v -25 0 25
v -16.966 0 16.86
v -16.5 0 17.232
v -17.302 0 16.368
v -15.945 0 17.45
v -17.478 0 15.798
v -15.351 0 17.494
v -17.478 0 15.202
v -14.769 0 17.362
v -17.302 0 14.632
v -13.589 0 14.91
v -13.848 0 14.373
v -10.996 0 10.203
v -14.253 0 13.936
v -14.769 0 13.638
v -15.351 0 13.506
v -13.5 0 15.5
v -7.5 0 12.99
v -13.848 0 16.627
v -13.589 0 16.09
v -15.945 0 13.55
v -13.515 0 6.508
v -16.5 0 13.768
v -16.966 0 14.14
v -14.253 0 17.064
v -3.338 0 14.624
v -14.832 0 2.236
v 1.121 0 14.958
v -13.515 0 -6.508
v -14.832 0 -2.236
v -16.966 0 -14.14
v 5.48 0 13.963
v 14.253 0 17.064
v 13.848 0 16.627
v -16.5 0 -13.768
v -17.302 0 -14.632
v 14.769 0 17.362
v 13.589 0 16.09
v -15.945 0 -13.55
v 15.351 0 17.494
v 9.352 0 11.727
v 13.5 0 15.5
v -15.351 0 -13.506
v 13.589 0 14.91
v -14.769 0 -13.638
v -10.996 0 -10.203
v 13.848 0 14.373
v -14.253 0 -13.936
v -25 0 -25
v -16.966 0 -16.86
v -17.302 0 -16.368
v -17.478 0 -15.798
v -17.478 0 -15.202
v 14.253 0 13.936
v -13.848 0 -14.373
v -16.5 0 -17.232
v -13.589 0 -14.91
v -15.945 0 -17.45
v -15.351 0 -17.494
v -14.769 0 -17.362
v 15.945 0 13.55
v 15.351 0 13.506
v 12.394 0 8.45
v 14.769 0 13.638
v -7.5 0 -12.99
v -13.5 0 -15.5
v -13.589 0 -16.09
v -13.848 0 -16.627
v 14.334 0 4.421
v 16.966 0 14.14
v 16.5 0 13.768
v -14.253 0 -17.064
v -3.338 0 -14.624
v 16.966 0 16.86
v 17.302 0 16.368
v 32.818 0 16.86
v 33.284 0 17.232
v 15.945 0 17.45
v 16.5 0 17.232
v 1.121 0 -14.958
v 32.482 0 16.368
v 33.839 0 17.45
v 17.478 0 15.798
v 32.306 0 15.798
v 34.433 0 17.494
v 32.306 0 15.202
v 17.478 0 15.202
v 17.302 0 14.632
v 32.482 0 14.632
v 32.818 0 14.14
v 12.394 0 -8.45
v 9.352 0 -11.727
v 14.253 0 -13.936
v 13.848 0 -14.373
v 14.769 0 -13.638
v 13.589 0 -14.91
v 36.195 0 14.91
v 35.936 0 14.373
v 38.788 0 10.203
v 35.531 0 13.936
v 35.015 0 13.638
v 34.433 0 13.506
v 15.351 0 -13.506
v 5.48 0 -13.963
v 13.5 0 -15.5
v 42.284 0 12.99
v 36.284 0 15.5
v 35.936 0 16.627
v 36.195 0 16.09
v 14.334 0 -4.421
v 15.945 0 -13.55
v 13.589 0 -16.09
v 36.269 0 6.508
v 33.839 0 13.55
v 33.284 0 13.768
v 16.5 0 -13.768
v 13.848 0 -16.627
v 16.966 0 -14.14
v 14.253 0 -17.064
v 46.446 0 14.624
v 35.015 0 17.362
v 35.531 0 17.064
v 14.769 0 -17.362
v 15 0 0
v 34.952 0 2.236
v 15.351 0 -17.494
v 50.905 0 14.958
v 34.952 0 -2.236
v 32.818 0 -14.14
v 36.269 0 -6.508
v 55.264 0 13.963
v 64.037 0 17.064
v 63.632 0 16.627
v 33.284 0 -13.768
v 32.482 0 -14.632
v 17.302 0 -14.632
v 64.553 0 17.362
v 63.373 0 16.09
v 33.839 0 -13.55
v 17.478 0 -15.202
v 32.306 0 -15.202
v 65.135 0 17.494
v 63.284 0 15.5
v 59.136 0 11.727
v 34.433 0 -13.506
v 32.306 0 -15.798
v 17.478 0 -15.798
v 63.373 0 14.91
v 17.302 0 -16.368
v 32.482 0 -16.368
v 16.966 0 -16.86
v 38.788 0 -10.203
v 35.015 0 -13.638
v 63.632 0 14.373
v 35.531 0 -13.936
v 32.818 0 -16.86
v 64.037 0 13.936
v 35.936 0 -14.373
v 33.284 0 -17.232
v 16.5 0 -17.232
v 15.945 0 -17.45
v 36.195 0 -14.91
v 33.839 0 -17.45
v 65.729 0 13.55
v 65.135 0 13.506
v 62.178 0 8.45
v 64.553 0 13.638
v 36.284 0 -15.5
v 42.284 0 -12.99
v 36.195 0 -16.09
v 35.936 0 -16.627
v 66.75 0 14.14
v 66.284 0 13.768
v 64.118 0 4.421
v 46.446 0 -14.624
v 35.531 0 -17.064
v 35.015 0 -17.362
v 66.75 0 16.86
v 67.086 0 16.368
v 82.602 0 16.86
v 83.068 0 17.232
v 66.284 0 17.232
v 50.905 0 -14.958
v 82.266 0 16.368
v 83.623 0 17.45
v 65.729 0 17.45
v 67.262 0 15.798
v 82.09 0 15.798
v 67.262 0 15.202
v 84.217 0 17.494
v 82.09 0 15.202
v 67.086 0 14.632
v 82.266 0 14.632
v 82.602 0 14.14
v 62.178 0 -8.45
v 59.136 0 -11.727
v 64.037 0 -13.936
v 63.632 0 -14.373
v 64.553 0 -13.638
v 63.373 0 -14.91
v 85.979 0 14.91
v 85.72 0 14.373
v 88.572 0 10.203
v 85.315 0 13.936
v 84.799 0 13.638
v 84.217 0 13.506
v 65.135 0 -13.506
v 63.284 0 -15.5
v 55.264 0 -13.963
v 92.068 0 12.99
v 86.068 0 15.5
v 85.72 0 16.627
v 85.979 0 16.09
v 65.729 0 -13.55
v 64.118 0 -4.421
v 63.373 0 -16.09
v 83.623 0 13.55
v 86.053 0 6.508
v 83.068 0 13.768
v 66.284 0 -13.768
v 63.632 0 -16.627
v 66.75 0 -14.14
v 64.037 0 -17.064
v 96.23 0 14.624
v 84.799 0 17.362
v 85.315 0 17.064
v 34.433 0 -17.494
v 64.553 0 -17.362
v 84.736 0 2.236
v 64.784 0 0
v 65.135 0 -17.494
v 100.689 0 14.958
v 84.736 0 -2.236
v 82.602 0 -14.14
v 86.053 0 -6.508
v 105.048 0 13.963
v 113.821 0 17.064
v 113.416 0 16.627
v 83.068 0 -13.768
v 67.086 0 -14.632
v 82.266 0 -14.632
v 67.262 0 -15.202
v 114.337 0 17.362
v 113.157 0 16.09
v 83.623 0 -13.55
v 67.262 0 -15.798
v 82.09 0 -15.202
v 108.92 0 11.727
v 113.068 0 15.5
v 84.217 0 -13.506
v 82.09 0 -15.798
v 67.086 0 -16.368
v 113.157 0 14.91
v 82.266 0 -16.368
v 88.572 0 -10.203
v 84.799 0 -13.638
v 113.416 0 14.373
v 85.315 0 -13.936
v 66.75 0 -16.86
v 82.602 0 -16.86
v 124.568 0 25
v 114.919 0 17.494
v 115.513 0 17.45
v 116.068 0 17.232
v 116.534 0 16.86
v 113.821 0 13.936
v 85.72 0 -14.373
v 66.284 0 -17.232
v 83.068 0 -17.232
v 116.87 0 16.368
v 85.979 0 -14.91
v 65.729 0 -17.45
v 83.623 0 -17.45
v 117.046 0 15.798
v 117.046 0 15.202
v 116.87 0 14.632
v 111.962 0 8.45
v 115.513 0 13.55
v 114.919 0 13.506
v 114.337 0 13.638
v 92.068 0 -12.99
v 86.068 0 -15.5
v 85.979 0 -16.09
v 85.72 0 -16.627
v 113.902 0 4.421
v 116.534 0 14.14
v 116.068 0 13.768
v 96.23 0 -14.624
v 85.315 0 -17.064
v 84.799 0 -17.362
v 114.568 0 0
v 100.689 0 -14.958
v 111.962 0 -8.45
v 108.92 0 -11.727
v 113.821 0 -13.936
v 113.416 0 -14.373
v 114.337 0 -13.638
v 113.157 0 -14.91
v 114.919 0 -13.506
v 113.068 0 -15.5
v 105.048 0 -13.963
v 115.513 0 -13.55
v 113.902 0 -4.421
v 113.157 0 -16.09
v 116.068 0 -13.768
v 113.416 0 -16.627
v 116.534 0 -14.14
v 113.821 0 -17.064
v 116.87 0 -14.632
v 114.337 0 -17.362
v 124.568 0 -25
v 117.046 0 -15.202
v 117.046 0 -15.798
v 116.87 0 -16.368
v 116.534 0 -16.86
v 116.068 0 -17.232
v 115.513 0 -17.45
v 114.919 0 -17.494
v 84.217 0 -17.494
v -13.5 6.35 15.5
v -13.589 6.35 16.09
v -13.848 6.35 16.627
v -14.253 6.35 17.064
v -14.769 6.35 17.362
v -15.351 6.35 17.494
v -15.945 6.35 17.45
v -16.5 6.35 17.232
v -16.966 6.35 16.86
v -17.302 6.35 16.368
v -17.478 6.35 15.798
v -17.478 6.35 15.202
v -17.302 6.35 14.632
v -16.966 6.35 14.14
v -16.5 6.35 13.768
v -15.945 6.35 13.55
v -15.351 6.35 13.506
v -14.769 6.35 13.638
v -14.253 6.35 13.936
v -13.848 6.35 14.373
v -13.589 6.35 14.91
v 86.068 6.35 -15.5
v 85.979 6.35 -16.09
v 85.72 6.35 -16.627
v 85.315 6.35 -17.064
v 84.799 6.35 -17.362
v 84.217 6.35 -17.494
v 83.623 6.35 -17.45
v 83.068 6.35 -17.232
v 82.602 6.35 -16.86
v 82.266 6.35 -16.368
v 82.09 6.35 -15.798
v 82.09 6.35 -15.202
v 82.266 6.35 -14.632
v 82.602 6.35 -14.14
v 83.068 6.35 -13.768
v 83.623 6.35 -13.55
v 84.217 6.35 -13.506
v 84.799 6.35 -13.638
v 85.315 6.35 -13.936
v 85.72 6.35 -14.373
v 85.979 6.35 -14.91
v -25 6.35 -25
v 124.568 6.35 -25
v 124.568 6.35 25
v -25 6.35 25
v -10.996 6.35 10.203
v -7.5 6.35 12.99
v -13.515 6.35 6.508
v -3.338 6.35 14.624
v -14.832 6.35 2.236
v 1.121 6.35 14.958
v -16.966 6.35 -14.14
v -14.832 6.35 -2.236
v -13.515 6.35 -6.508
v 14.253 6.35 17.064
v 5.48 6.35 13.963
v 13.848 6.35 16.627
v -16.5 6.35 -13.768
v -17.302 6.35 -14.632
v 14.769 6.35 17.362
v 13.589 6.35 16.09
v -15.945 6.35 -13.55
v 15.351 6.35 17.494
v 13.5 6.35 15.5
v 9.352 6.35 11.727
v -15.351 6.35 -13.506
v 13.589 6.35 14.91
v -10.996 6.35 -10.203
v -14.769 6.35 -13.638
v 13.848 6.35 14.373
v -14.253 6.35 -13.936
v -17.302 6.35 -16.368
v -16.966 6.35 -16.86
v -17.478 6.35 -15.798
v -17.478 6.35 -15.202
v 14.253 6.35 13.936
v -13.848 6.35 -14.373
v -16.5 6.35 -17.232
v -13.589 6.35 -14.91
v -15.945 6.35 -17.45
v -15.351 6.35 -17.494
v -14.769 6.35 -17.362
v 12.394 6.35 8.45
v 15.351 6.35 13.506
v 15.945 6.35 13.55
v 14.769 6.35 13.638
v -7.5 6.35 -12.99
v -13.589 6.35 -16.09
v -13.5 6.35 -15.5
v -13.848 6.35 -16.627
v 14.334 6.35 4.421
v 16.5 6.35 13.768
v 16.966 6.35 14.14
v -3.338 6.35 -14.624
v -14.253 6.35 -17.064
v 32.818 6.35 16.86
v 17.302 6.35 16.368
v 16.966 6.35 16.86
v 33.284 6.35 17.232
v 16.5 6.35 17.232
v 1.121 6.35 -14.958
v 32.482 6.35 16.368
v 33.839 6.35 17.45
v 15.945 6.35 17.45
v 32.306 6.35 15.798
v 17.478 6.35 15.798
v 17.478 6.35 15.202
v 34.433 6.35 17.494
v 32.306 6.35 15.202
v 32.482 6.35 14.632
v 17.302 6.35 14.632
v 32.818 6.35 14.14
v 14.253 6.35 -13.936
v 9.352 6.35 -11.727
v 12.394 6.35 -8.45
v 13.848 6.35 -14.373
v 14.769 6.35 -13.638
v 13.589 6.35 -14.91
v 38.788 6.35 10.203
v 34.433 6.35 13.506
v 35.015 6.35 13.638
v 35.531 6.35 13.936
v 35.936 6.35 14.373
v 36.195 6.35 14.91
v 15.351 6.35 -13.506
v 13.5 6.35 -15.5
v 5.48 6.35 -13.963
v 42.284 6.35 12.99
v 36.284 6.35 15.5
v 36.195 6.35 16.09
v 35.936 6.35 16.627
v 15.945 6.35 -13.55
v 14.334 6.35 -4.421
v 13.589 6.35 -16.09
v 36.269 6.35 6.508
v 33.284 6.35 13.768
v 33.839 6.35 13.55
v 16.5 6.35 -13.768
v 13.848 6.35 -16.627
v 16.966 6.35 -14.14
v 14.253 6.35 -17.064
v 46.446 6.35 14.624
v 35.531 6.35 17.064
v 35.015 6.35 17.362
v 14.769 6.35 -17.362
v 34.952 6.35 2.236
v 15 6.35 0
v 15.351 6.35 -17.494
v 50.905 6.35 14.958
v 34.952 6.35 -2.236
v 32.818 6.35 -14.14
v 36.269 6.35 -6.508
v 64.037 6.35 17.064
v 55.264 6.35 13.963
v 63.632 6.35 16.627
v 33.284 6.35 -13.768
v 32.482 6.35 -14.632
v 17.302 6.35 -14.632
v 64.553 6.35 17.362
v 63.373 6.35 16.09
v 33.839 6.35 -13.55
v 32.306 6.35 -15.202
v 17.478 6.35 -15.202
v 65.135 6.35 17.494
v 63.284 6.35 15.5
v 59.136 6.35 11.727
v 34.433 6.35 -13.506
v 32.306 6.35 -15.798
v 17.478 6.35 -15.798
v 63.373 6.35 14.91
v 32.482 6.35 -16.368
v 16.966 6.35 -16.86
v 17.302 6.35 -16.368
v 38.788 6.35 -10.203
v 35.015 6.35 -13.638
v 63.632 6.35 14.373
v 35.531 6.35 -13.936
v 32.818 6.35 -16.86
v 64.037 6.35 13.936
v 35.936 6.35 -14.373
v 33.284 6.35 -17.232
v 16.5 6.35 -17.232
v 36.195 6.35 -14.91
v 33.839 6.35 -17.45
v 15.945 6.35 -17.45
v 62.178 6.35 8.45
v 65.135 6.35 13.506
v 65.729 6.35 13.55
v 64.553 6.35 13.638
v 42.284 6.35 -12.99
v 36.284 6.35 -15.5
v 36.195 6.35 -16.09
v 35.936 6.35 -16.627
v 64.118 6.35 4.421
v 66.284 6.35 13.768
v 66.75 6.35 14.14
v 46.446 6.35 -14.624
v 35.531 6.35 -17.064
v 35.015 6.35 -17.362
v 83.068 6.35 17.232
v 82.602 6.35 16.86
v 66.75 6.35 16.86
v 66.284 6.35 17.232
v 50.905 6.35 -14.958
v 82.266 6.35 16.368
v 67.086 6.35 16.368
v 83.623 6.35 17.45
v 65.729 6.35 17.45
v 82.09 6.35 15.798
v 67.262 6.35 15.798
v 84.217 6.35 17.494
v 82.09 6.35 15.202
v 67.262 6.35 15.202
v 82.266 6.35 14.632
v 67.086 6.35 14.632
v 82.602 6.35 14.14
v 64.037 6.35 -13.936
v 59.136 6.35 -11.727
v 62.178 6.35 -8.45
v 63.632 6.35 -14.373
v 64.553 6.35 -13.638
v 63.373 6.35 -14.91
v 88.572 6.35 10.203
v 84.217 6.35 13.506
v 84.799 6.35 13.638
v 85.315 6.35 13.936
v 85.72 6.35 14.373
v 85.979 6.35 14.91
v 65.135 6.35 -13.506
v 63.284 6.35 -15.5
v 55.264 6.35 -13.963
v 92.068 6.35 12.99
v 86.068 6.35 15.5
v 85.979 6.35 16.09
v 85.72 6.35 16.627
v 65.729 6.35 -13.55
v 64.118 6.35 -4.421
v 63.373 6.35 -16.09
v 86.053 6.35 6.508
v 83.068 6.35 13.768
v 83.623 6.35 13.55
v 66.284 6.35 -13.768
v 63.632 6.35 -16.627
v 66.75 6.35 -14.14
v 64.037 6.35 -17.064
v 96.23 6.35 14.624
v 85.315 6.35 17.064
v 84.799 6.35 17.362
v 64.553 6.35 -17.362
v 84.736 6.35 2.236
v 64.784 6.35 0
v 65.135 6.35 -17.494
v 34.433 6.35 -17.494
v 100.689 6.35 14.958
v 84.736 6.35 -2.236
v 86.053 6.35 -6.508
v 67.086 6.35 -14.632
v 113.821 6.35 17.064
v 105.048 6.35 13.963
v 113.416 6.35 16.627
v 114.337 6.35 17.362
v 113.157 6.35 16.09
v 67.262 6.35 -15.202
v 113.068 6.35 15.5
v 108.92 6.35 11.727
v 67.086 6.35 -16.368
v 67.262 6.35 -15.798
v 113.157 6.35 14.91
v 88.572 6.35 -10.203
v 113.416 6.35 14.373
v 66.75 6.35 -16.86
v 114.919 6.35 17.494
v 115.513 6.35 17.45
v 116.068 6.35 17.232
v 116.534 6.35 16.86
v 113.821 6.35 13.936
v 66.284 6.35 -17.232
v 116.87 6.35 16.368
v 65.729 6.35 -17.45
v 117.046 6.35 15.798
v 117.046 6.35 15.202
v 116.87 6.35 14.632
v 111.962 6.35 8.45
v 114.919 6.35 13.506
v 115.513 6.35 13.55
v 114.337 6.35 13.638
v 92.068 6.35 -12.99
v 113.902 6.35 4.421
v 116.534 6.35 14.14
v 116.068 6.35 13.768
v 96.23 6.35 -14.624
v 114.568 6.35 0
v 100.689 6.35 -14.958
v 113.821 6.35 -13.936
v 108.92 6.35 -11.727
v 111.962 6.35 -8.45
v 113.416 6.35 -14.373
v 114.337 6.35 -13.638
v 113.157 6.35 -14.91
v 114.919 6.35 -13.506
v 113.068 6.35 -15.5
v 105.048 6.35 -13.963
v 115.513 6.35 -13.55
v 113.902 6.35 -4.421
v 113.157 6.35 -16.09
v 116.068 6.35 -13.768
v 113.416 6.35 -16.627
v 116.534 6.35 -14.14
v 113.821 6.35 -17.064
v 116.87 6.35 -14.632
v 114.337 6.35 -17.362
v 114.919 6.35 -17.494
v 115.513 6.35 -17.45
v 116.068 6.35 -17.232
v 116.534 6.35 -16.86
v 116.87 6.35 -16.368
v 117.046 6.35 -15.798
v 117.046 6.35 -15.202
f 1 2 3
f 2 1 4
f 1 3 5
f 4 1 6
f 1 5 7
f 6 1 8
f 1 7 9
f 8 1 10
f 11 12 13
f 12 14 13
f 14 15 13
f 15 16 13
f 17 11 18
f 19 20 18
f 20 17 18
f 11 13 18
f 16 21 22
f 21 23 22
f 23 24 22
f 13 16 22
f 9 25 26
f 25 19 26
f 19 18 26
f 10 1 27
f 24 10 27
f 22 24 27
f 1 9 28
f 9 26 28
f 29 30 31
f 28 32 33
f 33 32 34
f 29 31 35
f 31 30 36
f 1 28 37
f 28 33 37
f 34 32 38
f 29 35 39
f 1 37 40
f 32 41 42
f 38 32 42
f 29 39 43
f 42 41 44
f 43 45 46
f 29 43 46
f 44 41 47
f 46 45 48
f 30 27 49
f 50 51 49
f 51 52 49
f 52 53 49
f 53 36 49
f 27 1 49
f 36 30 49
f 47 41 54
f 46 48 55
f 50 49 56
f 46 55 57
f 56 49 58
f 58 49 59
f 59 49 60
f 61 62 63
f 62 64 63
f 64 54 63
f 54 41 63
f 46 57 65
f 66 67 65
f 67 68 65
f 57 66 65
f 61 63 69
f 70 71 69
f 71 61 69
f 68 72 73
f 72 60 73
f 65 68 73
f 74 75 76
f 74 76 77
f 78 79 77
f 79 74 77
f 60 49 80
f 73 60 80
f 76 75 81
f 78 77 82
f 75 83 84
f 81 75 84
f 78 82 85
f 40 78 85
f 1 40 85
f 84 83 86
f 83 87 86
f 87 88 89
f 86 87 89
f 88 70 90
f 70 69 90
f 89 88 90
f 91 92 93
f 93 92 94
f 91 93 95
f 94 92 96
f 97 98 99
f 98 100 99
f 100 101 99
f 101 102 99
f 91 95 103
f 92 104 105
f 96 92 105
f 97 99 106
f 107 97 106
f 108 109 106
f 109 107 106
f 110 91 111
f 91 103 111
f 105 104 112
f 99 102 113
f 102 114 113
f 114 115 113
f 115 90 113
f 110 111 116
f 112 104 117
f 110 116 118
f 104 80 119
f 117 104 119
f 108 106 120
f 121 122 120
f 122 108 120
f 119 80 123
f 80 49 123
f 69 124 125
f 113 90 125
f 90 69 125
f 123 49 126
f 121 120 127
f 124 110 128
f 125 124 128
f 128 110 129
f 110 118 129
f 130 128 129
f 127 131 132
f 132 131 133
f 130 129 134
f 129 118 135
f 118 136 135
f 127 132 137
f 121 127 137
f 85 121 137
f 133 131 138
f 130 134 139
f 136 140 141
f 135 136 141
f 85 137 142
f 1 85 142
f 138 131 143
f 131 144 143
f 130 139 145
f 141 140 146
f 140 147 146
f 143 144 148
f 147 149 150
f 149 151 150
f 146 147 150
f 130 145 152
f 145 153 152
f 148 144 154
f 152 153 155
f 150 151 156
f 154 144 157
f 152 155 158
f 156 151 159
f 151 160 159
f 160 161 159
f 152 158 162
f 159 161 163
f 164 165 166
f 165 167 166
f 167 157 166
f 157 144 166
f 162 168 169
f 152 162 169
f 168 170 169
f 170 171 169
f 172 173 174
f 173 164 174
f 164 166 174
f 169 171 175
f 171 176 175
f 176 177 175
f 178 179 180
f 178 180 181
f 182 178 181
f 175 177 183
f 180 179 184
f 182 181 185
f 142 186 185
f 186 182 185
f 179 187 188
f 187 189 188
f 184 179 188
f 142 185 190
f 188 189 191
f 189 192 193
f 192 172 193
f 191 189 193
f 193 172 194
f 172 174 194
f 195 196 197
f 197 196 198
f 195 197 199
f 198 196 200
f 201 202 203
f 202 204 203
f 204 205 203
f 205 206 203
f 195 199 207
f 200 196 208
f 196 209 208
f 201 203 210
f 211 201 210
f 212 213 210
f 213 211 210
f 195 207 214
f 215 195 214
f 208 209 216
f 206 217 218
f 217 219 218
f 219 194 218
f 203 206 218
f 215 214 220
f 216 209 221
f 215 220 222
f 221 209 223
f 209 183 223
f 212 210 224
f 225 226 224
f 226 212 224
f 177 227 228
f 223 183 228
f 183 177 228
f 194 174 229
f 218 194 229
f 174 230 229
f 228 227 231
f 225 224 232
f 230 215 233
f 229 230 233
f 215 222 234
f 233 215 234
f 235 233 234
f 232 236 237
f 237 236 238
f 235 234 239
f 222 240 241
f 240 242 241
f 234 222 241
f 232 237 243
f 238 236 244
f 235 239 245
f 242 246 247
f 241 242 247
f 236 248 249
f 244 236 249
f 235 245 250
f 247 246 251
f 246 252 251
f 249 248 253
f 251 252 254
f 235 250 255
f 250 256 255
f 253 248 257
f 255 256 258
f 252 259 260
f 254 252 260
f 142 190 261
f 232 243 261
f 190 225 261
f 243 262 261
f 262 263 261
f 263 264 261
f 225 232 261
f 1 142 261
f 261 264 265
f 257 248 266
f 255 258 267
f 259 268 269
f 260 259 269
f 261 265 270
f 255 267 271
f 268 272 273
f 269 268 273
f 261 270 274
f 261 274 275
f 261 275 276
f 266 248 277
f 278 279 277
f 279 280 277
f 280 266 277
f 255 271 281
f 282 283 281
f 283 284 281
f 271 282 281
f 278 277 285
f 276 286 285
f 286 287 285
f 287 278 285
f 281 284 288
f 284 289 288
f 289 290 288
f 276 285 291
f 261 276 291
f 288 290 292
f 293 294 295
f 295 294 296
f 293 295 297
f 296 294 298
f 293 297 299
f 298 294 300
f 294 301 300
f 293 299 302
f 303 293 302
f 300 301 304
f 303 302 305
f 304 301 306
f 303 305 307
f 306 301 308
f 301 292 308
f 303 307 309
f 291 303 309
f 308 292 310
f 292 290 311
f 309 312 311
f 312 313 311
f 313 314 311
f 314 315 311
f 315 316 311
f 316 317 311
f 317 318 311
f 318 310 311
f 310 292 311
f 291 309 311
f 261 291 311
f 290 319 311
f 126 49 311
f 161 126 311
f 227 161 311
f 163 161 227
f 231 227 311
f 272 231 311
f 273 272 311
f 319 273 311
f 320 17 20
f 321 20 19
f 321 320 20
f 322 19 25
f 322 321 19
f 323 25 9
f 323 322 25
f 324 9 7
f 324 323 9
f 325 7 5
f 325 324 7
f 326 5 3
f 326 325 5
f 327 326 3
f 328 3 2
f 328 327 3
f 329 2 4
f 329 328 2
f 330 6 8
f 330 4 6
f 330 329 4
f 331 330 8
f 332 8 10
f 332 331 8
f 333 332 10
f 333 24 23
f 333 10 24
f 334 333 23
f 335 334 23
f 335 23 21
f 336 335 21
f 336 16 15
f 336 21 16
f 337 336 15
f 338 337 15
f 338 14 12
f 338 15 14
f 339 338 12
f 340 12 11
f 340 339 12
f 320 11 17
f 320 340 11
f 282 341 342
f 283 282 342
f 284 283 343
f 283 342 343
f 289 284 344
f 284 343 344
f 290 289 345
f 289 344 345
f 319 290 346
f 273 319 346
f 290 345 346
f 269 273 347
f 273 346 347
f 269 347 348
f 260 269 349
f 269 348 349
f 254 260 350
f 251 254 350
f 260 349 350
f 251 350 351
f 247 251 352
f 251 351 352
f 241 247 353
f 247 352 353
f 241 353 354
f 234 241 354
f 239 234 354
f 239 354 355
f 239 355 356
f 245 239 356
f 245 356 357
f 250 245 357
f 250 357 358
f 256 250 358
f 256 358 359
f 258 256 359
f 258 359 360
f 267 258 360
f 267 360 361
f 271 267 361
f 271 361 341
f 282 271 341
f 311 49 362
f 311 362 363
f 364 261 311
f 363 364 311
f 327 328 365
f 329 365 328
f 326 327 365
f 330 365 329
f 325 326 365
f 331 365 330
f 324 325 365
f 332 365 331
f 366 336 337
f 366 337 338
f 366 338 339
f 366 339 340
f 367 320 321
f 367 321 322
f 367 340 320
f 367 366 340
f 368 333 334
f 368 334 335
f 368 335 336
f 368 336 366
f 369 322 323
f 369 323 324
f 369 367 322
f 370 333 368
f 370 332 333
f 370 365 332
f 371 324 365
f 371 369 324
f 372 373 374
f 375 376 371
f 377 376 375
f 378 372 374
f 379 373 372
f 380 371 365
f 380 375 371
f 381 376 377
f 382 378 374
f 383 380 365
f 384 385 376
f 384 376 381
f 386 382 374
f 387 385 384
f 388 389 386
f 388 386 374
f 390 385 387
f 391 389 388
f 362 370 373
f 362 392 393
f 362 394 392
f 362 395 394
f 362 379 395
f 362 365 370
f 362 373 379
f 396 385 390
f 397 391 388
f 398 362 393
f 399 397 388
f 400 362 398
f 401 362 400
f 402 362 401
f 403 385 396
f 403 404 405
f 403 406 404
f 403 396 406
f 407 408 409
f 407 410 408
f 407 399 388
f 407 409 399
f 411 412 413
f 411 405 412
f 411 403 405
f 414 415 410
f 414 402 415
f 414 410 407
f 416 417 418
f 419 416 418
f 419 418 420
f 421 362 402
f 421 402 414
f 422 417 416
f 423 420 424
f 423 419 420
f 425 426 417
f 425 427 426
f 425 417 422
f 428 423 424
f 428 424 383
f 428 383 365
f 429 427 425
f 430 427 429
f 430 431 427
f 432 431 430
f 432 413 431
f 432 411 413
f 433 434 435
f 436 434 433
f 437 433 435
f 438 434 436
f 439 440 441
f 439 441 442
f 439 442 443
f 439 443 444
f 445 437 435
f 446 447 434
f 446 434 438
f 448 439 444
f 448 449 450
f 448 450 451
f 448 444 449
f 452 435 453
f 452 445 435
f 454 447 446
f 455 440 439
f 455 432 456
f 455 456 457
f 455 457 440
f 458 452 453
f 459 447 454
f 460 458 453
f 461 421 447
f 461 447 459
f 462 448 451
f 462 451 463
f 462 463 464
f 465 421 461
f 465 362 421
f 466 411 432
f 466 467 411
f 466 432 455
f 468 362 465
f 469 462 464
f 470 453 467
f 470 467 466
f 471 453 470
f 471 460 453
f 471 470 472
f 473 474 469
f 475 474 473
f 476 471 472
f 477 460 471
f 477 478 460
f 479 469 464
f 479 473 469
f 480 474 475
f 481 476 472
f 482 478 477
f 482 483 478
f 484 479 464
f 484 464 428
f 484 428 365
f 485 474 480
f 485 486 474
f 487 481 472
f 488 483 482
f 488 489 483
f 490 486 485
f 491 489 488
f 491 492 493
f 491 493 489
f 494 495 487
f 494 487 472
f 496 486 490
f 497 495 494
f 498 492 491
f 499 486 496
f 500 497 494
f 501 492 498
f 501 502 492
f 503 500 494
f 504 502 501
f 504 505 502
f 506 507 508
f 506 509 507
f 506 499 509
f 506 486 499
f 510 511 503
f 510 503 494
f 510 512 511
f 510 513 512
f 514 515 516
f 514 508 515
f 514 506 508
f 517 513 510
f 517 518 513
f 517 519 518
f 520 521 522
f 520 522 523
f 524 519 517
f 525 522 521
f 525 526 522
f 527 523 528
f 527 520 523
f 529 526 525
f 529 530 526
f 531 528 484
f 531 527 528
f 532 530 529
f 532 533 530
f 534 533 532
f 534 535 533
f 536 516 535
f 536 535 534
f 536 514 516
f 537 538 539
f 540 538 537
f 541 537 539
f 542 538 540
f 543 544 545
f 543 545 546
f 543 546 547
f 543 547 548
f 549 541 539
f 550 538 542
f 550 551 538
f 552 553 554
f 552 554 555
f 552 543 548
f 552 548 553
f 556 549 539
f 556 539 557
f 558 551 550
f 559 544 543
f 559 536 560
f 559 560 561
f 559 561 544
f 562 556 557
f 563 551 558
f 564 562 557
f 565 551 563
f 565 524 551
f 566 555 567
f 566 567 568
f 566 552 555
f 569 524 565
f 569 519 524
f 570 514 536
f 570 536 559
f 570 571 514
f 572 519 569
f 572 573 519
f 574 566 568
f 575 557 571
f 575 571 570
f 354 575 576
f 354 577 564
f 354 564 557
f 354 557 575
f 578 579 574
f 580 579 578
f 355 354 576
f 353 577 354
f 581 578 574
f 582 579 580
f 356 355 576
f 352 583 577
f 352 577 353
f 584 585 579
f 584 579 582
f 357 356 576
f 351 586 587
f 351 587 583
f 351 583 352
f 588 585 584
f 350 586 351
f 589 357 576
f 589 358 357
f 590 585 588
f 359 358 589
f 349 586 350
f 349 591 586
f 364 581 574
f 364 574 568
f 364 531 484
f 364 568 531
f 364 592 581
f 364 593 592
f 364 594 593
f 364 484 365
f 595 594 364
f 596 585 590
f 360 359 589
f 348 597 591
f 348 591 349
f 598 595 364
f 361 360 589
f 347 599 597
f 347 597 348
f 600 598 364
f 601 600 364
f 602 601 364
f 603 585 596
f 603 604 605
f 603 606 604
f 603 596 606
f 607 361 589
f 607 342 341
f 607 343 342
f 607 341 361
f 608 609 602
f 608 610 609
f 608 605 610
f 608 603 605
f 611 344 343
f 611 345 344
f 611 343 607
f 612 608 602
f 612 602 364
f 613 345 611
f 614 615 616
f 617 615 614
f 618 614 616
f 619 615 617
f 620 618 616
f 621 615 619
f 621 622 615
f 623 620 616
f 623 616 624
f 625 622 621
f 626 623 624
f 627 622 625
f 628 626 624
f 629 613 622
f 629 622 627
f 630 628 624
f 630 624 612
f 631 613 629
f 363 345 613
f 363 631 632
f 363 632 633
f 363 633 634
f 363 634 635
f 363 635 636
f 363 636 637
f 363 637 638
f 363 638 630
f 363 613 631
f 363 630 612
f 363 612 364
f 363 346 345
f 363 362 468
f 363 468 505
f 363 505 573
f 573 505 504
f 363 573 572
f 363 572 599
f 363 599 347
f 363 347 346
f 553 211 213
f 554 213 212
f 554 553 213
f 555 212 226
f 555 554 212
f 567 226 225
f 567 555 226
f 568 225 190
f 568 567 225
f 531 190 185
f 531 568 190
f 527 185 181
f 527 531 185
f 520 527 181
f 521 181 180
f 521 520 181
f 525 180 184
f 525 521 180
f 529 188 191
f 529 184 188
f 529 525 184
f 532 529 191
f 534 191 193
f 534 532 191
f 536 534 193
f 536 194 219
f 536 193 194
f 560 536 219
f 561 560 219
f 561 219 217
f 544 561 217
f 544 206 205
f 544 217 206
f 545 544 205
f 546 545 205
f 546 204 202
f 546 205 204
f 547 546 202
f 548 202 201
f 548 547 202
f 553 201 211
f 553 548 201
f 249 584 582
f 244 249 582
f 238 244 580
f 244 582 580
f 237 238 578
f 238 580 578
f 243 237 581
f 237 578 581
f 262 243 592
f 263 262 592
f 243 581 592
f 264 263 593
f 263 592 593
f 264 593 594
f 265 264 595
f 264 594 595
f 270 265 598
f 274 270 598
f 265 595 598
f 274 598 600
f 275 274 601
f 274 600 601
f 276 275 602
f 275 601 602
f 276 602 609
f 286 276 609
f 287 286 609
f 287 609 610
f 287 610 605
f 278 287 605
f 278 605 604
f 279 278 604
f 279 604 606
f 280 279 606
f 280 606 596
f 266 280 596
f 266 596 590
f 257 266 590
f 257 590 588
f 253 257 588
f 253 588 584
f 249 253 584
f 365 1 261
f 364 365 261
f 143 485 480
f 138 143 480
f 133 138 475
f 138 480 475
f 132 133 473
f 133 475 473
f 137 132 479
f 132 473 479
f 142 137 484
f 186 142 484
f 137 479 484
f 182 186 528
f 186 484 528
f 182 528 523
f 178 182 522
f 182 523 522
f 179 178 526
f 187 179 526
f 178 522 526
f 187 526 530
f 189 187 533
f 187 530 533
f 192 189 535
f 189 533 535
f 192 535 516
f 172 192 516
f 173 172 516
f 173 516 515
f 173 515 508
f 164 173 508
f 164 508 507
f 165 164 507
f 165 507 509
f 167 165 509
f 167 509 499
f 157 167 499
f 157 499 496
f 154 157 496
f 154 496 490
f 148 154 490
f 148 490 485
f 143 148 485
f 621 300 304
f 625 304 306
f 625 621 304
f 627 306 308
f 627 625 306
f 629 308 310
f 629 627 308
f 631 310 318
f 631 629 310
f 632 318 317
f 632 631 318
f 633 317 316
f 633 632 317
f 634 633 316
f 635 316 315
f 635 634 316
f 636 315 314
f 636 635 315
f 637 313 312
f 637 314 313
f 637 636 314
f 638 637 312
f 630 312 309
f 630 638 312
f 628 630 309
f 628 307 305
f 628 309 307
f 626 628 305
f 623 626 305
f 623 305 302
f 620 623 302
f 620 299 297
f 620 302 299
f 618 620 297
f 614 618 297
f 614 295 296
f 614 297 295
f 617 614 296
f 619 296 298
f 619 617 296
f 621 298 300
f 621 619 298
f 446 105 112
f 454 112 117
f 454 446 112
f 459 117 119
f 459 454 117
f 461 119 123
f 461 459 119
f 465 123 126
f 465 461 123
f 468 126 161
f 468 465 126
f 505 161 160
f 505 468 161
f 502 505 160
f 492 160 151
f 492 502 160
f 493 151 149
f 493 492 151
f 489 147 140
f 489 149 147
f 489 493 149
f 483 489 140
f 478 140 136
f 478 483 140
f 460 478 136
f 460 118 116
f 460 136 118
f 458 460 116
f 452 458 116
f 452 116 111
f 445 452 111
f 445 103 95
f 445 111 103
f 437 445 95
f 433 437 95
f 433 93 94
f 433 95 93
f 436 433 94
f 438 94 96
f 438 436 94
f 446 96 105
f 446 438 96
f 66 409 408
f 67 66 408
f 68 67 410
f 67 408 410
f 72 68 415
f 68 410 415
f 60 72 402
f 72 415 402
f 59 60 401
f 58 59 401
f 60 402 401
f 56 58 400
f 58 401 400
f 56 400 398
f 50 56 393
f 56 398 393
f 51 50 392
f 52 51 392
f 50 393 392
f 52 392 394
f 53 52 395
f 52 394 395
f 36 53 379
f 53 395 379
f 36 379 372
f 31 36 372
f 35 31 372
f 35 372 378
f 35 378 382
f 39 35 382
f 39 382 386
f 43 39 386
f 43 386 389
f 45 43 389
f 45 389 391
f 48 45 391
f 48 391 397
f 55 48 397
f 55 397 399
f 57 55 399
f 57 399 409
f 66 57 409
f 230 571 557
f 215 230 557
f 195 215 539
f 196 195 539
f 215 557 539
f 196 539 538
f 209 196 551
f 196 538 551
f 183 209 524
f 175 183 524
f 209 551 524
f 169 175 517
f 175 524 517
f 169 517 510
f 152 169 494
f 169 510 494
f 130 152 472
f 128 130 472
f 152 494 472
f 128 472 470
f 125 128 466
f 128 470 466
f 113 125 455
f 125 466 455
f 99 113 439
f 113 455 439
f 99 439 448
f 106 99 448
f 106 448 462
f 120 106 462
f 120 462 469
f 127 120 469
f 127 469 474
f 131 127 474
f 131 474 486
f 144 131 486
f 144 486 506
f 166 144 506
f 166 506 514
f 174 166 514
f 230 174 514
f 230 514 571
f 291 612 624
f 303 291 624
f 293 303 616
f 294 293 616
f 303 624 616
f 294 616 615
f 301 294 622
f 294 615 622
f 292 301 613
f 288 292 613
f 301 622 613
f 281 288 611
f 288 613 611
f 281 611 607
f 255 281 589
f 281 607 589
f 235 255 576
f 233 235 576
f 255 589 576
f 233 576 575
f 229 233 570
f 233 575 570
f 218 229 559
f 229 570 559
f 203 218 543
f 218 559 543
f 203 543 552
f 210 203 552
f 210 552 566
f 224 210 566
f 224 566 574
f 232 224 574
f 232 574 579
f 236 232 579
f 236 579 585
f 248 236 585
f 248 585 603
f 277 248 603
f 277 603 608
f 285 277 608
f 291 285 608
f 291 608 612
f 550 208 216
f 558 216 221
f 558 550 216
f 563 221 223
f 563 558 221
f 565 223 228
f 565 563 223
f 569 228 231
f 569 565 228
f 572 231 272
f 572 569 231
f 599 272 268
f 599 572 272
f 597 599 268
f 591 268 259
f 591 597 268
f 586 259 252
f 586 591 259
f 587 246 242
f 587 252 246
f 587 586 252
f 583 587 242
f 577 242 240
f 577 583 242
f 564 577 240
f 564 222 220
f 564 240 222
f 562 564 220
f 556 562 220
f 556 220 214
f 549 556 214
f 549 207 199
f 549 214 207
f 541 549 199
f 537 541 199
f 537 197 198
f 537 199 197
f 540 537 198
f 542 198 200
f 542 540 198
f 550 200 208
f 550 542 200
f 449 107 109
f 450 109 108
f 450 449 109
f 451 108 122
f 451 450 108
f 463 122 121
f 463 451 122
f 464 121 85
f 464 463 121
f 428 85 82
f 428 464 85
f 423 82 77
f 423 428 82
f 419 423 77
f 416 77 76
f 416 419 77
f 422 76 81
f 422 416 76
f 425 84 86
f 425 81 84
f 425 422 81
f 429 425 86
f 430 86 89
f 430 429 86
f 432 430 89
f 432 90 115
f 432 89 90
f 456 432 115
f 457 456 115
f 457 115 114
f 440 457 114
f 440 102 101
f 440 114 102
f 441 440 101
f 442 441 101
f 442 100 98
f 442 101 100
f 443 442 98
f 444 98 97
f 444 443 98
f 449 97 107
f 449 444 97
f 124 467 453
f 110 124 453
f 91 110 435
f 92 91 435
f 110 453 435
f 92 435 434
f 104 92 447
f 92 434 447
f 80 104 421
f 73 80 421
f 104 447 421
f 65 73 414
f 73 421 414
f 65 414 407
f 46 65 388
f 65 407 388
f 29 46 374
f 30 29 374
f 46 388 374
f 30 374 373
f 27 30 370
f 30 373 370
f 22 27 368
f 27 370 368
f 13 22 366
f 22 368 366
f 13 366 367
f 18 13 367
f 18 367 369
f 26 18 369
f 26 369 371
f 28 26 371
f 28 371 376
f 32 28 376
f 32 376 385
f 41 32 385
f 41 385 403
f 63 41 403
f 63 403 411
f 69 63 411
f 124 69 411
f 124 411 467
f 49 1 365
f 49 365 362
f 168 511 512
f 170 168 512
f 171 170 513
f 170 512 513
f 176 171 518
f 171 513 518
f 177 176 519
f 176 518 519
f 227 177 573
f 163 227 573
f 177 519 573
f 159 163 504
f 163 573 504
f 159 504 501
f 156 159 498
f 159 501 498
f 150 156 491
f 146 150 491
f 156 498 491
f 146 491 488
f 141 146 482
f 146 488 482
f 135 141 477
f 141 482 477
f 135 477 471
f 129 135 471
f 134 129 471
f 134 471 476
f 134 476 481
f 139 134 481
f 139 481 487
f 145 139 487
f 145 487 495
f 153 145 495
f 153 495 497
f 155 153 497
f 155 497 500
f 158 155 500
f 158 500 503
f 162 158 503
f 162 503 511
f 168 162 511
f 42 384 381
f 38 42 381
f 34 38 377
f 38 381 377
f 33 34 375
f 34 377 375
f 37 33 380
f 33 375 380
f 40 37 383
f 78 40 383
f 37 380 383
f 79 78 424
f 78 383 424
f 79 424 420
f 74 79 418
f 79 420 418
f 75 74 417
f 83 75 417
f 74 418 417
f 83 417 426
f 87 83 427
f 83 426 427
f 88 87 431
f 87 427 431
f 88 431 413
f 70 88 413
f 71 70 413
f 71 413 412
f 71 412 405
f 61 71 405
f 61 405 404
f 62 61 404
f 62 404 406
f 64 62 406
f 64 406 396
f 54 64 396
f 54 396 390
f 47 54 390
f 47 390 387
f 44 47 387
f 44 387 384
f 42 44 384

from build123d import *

# Parameters (mm, degrees)
SKETCH1_W               = 50
SKETCH1_H               = 50
BOSS_EXTRUDE1_DEPTH     = 6.35
SKETCH2_R               = 15
CUT_EXTRUDE1_DEPTH      = 1
CUT_EXTRUDE1_DEPTH_BACK = 7.35
SKETCH3_R               = 2
CUT_EXTRUDE2_DEPTH      = 7.35
MIRROR2_COPY_1_SKETCH_R = 2
MIRROR2_COPY_1_DEPTH    = 7.35
LPATTERN2_COUNT         = 3
LPATTERN2_PITCH         = 49.784


with BuildPart() as part:
    # Sketch1 → Boss-Extrude1 (new body)
    with BuildSketch(Plane(origin=(0, 0, 0), x_dir=(1, 0, 0), z_dir=(0, 1, 0))):
        Rectangle(SKETCH1_W, SKETCH1_H)
    extrude(amount=BOSS_EXTRUDE1_DEPTH)

    # Sketch2 → Cut-Extrude1 (cut, two sides)
    with BuildSketch(Plane(origin=(0, 6.35, 0), x_dir=(1, 0, 0), z_dir=(0, 1, 0))) as cut_extrude1_sk:
        Circle(SKETCH2_R)
    extrude(amount=CUT_EXTRUDE1_DEPTH, mode=Mode.SUBTRACT)
    extrude(cut_extrude1_sk.sketch, amount=-CUT_EXTRUDE1_DEPTH_BACK, mode=Mode.SUBTRACT)

    # Sketch3 → Cut-Extrude2 (cut, through all)
    with BuildSketch(Plane(origin=(0, 6.35, 0), x_dir=(1, 0, 0), z_dir=(0, 1, 0))):
        with Locations((-15.5, 15.5)):
            Circle(SKETCH3_R)
    cut_extrude2 = extrude(amount=-CUT_EXTRUDE2_DEPTH, mode=Mode.SUBTRACT)

    # Mirror1: Cut-Extrude2 across plane
    add(cut_extrude2.mirror(Plane(origin=(0, 0, 0), x_dir=(0, 0, 1), z_dir=(1, 0, 0))), mode=Mode.SUBTRACT)

    # Mirror2: Cut-Extrude2 across plane
    add(cut_extrude2.mirror(Plane.XY), mode=Mode.SUBTRACT)

    # Mirror2 copy 1 sketch → Mirror2 copy 1 (cut, through all)
    with BuildSketch(Plane(origin=(0, 6.35, 0), x_dir=(-1, 0, 0), z_dir=(0, 1, 0))):
        with Locations((-15.5, 15.5)):
            Circle(MIRROR2_COPY_1_SKETCH_R)
    extrude(amount=-MIRROR2_COPY_1_DEPTH, mode=Mode.SUBTRACT)


with BuildPart() as lpattern2_1:
    # LPattern2: pattern copy
    add(part.part.moved(Location(Vector(1, 0, 0) * (1 * LPATTERN2_PITCH))))


with BuildPart() as lpattern2_2:
    # LPattern2: pattern copy
    add(part.part.moved(Location(Vector(1, 0, 0) * (2 * LPATTERN2_PITCH))))


with BuildPart() as part_1:
    add(part.part)

    # Combine1: union LPattern2_1, LPattern2_2
    add(lpattern2_1.part)
    add(lpattern2_2.part)


solid = part_1.part
